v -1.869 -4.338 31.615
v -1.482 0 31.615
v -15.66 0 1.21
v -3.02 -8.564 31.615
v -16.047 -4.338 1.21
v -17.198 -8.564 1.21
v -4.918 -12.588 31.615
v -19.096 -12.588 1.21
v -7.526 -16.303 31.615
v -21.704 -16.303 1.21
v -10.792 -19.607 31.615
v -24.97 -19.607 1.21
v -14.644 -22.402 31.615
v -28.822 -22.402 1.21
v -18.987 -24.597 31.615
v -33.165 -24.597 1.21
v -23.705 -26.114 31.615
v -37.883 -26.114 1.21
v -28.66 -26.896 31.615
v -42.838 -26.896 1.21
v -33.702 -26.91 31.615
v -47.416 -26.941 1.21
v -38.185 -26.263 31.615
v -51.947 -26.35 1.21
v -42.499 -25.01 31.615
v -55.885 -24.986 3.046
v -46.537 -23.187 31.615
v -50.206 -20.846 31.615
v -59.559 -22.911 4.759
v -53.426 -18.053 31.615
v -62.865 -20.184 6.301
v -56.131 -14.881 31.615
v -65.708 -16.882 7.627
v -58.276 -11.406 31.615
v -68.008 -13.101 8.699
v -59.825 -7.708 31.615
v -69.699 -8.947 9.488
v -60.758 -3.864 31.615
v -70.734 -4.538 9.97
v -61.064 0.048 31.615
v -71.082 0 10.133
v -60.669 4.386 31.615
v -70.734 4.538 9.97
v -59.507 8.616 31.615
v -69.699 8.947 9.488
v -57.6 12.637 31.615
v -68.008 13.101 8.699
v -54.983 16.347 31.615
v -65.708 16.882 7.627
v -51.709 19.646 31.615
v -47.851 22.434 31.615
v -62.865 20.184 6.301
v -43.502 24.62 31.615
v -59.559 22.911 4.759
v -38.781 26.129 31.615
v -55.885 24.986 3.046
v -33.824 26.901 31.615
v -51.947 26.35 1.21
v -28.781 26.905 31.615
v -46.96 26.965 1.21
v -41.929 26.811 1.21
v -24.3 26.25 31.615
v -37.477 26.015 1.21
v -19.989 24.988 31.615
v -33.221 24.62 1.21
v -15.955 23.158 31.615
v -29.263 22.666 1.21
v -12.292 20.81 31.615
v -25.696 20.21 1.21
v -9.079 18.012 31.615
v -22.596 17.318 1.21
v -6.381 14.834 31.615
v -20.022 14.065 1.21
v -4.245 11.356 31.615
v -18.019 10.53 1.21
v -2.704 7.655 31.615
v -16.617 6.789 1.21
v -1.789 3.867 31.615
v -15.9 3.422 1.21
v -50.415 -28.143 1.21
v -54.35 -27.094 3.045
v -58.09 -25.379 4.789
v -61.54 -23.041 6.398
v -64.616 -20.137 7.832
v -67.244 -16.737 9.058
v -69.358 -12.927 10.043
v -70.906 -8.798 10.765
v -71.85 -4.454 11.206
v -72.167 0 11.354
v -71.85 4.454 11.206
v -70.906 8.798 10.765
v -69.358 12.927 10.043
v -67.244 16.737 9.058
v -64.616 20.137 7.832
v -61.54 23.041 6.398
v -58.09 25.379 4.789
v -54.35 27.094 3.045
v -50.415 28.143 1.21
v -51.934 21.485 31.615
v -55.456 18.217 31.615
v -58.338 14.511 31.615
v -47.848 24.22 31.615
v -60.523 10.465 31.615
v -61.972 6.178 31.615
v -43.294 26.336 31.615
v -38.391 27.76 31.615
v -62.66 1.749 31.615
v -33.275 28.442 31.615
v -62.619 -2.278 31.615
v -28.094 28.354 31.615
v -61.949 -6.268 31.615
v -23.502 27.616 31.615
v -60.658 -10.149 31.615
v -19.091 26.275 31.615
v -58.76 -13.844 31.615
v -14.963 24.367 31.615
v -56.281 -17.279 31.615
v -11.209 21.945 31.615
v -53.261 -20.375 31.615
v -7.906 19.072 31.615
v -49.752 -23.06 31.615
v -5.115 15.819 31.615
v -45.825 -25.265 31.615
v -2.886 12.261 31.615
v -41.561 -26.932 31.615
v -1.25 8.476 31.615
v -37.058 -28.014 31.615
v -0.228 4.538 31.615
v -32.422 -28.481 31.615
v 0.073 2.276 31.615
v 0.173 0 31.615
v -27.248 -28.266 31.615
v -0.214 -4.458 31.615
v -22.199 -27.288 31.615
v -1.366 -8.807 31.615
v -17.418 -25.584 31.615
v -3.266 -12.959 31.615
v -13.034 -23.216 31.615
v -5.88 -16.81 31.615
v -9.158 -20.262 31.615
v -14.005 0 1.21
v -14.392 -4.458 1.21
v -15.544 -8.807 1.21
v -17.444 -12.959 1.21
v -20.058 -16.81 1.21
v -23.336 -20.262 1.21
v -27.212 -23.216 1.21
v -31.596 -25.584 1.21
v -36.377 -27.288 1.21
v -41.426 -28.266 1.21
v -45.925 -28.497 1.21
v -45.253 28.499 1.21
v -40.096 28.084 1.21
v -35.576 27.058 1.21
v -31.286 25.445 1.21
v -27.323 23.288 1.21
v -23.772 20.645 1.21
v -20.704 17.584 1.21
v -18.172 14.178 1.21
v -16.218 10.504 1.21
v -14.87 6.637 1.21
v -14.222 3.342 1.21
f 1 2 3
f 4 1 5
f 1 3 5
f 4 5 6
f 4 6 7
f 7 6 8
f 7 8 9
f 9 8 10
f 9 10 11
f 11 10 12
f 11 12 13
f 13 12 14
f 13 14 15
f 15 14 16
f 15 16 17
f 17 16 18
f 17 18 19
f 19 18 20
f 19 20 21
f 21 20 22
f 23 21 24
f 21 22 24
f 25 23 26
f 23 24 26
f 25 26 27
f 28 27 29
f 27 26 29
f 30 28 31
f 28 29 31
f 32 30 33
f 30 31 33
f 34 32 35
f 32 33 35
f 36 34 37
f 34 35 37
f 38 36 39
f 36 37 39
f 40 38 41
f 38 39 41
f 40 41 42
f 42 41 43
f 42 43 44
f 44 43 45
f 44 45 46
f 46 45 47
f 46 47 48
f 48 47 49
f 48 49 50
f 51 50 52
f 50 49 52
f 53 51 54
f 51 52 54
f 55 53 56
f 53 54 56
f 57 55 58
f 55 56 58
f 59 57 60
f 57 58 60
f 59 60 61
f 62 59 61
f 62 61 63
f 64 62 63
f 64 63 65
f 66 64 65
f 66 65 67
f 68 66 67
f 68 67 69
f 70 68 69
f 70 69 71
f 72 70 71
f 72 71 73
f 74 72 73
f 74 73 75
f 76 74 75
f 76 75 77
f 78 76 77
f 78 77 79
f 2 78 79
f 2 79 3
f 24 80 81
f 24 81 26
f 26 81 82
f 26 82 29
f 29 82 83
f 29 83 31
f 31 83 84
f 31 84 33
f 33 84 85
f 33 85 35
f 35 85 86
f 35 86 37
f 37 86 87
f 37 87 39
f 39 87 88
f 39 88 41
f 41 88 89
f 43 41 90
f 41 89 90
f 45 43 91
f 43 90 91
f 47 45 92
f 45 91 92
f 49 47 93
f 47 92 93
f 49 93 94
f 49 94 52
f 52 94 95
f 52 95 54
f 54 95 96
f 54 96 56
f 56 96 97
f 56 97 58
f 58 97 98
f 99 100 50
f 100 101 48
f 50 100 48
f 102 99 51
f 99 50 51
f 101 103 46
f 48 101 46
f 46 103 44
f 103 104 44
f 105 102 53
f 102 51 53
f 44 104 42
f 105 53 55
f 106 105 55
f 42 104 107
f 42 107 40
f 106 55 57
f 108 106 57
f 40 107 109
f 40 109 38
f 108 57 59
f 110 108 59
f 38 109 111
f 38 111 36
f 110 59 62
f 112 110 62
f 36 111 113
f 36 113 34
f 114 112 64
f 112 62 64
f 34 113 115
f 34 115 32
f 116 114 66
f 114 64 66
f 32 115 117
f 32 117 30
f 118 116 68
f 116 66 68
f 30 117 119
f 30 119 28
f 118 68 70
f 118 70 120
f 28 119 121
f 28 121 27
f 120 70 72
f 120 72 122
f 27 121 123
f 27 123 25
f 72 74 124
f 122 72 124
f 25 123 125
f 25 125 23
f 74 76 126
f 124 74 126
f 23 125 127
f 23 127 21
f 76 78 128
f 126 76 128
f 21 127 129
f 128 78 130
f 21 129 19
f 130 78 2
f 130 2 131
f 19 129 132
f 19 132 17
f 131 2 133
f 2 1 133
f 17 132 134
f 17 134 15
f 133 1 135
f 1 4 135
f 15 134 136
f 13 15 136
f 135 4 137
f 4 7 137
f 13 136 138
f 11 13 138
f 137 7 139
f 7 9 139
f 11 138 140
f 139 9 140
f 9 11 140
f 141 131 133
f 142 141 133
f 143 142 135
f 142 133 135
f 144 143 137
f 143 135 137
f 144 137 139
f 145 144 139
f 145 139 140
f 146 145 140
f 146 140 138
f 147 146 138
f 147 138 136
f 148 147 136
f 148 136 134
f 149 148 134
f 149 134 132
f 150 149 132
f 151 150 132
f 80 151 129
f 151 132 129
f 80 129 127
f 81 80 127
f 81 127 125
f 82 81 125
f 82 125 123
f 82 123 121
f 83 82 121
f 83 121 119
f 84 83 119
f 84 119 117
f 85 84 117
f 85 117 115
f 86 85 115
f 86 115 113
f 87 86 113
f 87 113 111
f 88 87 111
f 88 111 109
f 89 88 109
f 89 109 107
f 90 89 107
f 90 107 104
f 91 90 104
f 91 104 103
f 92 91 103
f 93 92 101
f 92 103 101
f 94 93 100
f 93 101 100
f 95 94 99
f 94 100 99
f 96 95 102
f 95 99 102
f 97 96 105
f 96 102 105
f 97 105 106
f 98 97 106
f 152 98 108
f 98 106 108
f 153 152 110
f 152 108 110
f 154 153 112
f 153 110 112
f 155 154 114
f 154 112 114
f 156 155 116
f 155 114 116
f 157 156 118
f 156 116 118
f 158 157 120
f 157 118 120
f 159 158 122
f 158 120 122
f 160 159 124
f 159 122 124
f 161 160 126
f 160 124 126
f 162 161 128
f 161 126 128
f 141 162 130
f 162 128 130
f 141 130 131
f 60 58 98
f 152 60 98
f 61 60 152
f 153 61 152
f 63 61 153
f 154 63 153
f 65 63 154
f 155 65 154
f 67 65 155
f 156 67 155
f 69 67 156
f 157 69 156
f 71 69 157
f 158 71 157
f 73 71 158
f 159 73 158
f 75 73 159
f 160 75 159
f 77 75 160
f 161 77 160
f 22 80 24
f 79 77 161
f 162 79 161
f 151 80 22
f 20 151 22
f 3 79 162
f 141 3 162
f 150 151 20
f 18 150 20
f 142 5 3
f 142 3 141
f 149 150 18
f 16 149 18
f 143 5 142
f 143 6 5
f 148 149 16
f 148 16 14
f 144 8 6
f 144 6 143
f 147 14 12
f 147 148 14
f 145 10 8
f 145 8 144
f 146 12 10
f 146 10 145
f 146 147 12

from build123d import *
from build123d import SkipClean  # not in build123d's __all__

# Parameters (mm, degrees)
F2_W     = 200
F2_H     = 100
F2_H_2   = 20
F3_DEPTH = 100
F2_W_2   = 75
F2_H_3   = 25
F6_DEPTH = 35
F8_W     = 96.0638802499
F8_H     = 5.2582259355
F9_DEPTH = 50


# Not quite as in the source:
# - ends of sketch curves that miss each other by under 0.0002 mm in the source are joined
# - a feature of the source that left no trace in its solid (it failed there, or was rolled back) is left out
# - a feature names something its author has since deleted; it is built from what else it names


with BuildPart() as f1:
    # F0 (on Front) → F1 (revolve)
    with BuildSketch(Plane.XZ):
        with BuildLine():
            add(Edge.make_bspline(
                [(45.9368361786, 26.8256458213), (91.5796084466, 124.7068868213), (26.32544778, 155.1354016666)],
                knots=[4.7123889804, 4.7123889804, 4.7123889804, 6.2831853072, 6.2831853072, 6.2831853072], degree=2, weights=[1, 0.7071067812, 1]))
            Line((26.32544778, 155.1354016666), (25.4802112565, 153.3227860925))
            add(Edge.make_bspline(
                [(44.1242206045, 27.6708823448), (88.921756349, 123.7395077707), (25.4802112565, 153.3227860925)],
                knots=[4.7123889804, 4.7123889804, 4.7123889804, 6.2831853072, 6.2831853072, 6.2831853072], degree=2, weights=[1, 0.7071067812, 1]))
            Line((44.1242206045, 27.6708823448), (45.9368361786, 26.8256458213))
        make_face()
    revolve(axis=Axis((-11.7101957767, 0, 73.5677008333), (-0.4226182617, 0, -0.906307787)))


with BuildPart() as f1b:
    # F0 (on Front) → F1, piece 2 (revolve)
    with BuildSketch(Plane.XZ):
        Polygon((0.1731735164, 31.6149234015), (-1.1862881642, 32.2488507941), (-15.9779273251, 0.5280782478), (-14.6184656445, -0.1058491448), align=None)
        with BuildLine():
            add(Edge.make_bspline(
                [(-22.1410875874, -12.6888615869), (-21.3247514691, -12.7218189818), (-20.5078685114, -12.7357143506)],
                knots=[0.3959818916, 0.3959818916, 0.3959818916, 0.4193237212, 0.4193237212, 0.4193237212], degree=2, weights=[1, 0.9999318956, 1]))
            Line((-20.5078685114, -12.7357143506), (-14.6184656445, -0.1058491448))
            Line((-14.6184656445, -0.1058491448), (-15.9779273251, 0.5280782478))
            Line((-15.9779273251, 0.5280782478), (-22.1410875874, -12.6888615869))
        make_face()
    revolve(axis=Axis((-11.7101957767, 0, 73.5677008333), (-0.4226182617, 0, -0.906307787)))


with BuildPart() as f3_tool:
    # F2 (on Front) → F3 (new body, symmetric)
    with BuildSketch(Plane.XZ):
        with Locations((-9.317324488, 115)):
            Rectangle(F2_W, F2_H)
        with Locations((0, -10)):
            Rectangle(F2_W, F2_H_2)
    extrude(amount=F3_DEPTH, both=True)


with BuildPart() as f1_1:
    add(f1.part, clean=False)

    # F3: cut by f3_tool
    add(f3_tool.part, mode=Mode.SUBTRACT)

    # F0 (on Front) → F7 (revolve, cut)
    with BuildSketch(Plane.XZ):
        with BuildLine():
            add(Edge.make_bspline(
                [(-84.5714851547, 87.682675512), (-114.9949652888, 22.4393118183), (-49.756636783, -7.9949639789)],
                knots=[4.7123889804, 4.7123889804, 4.7123889804, 6.2830198332, 6.2830198332, 6.2830198332], degree=2, weights=[1, 0.7071652827, 1]))
            Line((-49.756636783, -7.9949639789), (-49.7458393334, -8))
            Line((-49.7458393334, -8), (-49.735042102, -8.0050348317))
            add(Edge.make_bspline(
                [(-49.735042102, -8.0050348317), (15.5133557484, -38.4177185072), (45.9368361786, 26.8256458213)],
                knots=[0.0001654643, 0.0001654643, 0.0001654643, 1.5707963268, 1.5707963268, 1.5707963268], degree=2, weights=[1, 0.7071652792, 1]))
            Line((45.9368361786, 26.8256458213), (44.1242206045, 27.6708823448))
            add(Edge.make_bspline(
                [(-20.5078685114, -12.7357143506), (24.9219656119, -13.5084863764), (44.1242206045, 27.6708823448)],
                knots=[0.4193237212, 0.4193237212, 0.4193237212, 1.5707963268, 1.5707963268, 1.5707963268], degree=2, weights=[1, 0.8387916479, 1]))
            add(Edge.make_bspline(
                [(-22.1410875874, -12.6888615869), (-21.3247514691, -12.7218189818), (-20.5078685114, -12.7357143506)],
                knots=[0.3959818916, 0.3959818916, 0.3959818916, 0.4193237212, 0.4193237212, 0.4193237212], degree=2, weights=[1, 0.9999318956, 1]))
            add(Edge.make_bspline(
                [(-38.8967253804, -9.951843981), (-30.686098613, -12.3438795424), (-22.1410875874, -12.6888615869)],
                knots=[0.1528447244, 0.1528447244, 0.1528447244, 0.3959818916, 0.3959818916, 0.3959818916], degree=2, weights=[1, 0.9926196359, 1]))
            add(Edge.make_bspline(
                [(-48.9006028099, -6.1873844259), (-44.042789232, -8.4526200992), (-38.8967253804, -9.951843981)],
                knots=[0, 0, 0, 0.1528447244, 0.1528447244, 0.1528447244], degree=2, weights=[1, 0.9970812323, 1]))
            add(Edge.make_bspline(
                [(-48.9112500264, -6.1824184595), (-48.9059266265, -6.1849018895), (-48.9006028099, -6.1873844259)],
                knots=[6.2830174734, 6.2830174734, 6.2830174734, 6.2831853072, 6.2831853072, 6.2831853072], degree=2, weights=[1, 0.9999999965, 1]))
            add(Edge.make_bspline(
                [(-71.0817080874, 10.1325245471), (-61.6323129878, -0.2478899078), (-48.9112500264, -6.1824184595)],
                knots=[5.8872034156, 5.8872034156, 5.8872034156, 6.2830174734, 6.2830174734, 6.2830174734], degree=2, weights=[1, 0.9804802401, 1]))
            add(Edge.make_bspline(
                [(-72.1674123725, 11.3535265686), (-71.6316856587, 10.7366896891), (-71.0817080874, 10.1325245471)],
                knots=[5.863861586, 5.863861586, 5.863861586, 5.8872034156, 5.8872034156, 5.8872034156], degree=2, weights=[1, 0.9999318956, 1]))
            add(Edge.make_bspline(
                [(-82.7588695806, 86.8374389885), (-101.9611245733, 45.6580702673), (-72.1674123725, 11.3535265686)],
                knots=[4.7123889804, 4.7123889804, 4.7123889804, 5.863861586, 5.863861586, 5.863861586], degree=2, weights=[1, 0.8387916479, 1]))
            Line((-82.7588695806, 86.8374389885), (-84.5714851547, 87.682675512))
        make_face()
        with BuildLine():
            add(Edge.make_bspline(
                [(26.32544778, 155.1354016666), (-38.9287128867, 185.5639165119), (-84.5714851547, 87.682675512)],
                knots=[0, 0, 0, 1.5707963268, 1.5707963268, 1.5707963268], degree=2, weights=[1, 0.7071067812, 1]))
            Line((-84.5714851547, 87.682675512), (-82.7588695806, 86.8374389885))
            add(Edge.make_bspline(
                [(25.4802112565, 153.3227860925), (-37.9613338361, 182.9060644144), (-82.7588695806, 86.8374389885)],
                knots=[0, 0, 0, 1.5707963268, 1.5707963268, 1.5707963268], degree=2, weights=[1, 0.7071067812, 1]))
            Line((25.4802112565, 153.3227860925), (26.32544778, 155.1354016666))
        make_face()
    with SkipClean():  # cleaning this boolean's faces spoils the solid; the shape is the same uncleaned
        revolve(axis=Axis((-11.7101957767, 0, 73.5677008333), (-0.4226182617, 0, -0.906307787)), mode=Mode.SUBTRACT)


with BuildPart() as f1b_1:
    add(f1b.part, clean=False)

    # F3: cut by f3_tool
    add(f3_tool.part, mode=Mode.SUBTRACT)

    # F2 (on Front) → F6 (cut, symmetric)
    with BuildSketch(Plane.XZ):
        with Locations((-37.3268264836, 44.1149234015)):
            Rectangle(F2_W_2, F2_H_3)
    extrude(amount=F6_DEPTH, both=True, mode=Mode.SUBTRACT)

    # F8 (on Front) → F9 (cut, symmetric)
    with BuildSketch(Plane.XZ):
        with Locations((-19.0352806821, -1.4191129678)):
            Rectangle(F8_W, F8_H)
    extrude(amount=F9_DEPTH, both=True, mode=Mode.SUBTRACT)


solid = f1b_1.part
